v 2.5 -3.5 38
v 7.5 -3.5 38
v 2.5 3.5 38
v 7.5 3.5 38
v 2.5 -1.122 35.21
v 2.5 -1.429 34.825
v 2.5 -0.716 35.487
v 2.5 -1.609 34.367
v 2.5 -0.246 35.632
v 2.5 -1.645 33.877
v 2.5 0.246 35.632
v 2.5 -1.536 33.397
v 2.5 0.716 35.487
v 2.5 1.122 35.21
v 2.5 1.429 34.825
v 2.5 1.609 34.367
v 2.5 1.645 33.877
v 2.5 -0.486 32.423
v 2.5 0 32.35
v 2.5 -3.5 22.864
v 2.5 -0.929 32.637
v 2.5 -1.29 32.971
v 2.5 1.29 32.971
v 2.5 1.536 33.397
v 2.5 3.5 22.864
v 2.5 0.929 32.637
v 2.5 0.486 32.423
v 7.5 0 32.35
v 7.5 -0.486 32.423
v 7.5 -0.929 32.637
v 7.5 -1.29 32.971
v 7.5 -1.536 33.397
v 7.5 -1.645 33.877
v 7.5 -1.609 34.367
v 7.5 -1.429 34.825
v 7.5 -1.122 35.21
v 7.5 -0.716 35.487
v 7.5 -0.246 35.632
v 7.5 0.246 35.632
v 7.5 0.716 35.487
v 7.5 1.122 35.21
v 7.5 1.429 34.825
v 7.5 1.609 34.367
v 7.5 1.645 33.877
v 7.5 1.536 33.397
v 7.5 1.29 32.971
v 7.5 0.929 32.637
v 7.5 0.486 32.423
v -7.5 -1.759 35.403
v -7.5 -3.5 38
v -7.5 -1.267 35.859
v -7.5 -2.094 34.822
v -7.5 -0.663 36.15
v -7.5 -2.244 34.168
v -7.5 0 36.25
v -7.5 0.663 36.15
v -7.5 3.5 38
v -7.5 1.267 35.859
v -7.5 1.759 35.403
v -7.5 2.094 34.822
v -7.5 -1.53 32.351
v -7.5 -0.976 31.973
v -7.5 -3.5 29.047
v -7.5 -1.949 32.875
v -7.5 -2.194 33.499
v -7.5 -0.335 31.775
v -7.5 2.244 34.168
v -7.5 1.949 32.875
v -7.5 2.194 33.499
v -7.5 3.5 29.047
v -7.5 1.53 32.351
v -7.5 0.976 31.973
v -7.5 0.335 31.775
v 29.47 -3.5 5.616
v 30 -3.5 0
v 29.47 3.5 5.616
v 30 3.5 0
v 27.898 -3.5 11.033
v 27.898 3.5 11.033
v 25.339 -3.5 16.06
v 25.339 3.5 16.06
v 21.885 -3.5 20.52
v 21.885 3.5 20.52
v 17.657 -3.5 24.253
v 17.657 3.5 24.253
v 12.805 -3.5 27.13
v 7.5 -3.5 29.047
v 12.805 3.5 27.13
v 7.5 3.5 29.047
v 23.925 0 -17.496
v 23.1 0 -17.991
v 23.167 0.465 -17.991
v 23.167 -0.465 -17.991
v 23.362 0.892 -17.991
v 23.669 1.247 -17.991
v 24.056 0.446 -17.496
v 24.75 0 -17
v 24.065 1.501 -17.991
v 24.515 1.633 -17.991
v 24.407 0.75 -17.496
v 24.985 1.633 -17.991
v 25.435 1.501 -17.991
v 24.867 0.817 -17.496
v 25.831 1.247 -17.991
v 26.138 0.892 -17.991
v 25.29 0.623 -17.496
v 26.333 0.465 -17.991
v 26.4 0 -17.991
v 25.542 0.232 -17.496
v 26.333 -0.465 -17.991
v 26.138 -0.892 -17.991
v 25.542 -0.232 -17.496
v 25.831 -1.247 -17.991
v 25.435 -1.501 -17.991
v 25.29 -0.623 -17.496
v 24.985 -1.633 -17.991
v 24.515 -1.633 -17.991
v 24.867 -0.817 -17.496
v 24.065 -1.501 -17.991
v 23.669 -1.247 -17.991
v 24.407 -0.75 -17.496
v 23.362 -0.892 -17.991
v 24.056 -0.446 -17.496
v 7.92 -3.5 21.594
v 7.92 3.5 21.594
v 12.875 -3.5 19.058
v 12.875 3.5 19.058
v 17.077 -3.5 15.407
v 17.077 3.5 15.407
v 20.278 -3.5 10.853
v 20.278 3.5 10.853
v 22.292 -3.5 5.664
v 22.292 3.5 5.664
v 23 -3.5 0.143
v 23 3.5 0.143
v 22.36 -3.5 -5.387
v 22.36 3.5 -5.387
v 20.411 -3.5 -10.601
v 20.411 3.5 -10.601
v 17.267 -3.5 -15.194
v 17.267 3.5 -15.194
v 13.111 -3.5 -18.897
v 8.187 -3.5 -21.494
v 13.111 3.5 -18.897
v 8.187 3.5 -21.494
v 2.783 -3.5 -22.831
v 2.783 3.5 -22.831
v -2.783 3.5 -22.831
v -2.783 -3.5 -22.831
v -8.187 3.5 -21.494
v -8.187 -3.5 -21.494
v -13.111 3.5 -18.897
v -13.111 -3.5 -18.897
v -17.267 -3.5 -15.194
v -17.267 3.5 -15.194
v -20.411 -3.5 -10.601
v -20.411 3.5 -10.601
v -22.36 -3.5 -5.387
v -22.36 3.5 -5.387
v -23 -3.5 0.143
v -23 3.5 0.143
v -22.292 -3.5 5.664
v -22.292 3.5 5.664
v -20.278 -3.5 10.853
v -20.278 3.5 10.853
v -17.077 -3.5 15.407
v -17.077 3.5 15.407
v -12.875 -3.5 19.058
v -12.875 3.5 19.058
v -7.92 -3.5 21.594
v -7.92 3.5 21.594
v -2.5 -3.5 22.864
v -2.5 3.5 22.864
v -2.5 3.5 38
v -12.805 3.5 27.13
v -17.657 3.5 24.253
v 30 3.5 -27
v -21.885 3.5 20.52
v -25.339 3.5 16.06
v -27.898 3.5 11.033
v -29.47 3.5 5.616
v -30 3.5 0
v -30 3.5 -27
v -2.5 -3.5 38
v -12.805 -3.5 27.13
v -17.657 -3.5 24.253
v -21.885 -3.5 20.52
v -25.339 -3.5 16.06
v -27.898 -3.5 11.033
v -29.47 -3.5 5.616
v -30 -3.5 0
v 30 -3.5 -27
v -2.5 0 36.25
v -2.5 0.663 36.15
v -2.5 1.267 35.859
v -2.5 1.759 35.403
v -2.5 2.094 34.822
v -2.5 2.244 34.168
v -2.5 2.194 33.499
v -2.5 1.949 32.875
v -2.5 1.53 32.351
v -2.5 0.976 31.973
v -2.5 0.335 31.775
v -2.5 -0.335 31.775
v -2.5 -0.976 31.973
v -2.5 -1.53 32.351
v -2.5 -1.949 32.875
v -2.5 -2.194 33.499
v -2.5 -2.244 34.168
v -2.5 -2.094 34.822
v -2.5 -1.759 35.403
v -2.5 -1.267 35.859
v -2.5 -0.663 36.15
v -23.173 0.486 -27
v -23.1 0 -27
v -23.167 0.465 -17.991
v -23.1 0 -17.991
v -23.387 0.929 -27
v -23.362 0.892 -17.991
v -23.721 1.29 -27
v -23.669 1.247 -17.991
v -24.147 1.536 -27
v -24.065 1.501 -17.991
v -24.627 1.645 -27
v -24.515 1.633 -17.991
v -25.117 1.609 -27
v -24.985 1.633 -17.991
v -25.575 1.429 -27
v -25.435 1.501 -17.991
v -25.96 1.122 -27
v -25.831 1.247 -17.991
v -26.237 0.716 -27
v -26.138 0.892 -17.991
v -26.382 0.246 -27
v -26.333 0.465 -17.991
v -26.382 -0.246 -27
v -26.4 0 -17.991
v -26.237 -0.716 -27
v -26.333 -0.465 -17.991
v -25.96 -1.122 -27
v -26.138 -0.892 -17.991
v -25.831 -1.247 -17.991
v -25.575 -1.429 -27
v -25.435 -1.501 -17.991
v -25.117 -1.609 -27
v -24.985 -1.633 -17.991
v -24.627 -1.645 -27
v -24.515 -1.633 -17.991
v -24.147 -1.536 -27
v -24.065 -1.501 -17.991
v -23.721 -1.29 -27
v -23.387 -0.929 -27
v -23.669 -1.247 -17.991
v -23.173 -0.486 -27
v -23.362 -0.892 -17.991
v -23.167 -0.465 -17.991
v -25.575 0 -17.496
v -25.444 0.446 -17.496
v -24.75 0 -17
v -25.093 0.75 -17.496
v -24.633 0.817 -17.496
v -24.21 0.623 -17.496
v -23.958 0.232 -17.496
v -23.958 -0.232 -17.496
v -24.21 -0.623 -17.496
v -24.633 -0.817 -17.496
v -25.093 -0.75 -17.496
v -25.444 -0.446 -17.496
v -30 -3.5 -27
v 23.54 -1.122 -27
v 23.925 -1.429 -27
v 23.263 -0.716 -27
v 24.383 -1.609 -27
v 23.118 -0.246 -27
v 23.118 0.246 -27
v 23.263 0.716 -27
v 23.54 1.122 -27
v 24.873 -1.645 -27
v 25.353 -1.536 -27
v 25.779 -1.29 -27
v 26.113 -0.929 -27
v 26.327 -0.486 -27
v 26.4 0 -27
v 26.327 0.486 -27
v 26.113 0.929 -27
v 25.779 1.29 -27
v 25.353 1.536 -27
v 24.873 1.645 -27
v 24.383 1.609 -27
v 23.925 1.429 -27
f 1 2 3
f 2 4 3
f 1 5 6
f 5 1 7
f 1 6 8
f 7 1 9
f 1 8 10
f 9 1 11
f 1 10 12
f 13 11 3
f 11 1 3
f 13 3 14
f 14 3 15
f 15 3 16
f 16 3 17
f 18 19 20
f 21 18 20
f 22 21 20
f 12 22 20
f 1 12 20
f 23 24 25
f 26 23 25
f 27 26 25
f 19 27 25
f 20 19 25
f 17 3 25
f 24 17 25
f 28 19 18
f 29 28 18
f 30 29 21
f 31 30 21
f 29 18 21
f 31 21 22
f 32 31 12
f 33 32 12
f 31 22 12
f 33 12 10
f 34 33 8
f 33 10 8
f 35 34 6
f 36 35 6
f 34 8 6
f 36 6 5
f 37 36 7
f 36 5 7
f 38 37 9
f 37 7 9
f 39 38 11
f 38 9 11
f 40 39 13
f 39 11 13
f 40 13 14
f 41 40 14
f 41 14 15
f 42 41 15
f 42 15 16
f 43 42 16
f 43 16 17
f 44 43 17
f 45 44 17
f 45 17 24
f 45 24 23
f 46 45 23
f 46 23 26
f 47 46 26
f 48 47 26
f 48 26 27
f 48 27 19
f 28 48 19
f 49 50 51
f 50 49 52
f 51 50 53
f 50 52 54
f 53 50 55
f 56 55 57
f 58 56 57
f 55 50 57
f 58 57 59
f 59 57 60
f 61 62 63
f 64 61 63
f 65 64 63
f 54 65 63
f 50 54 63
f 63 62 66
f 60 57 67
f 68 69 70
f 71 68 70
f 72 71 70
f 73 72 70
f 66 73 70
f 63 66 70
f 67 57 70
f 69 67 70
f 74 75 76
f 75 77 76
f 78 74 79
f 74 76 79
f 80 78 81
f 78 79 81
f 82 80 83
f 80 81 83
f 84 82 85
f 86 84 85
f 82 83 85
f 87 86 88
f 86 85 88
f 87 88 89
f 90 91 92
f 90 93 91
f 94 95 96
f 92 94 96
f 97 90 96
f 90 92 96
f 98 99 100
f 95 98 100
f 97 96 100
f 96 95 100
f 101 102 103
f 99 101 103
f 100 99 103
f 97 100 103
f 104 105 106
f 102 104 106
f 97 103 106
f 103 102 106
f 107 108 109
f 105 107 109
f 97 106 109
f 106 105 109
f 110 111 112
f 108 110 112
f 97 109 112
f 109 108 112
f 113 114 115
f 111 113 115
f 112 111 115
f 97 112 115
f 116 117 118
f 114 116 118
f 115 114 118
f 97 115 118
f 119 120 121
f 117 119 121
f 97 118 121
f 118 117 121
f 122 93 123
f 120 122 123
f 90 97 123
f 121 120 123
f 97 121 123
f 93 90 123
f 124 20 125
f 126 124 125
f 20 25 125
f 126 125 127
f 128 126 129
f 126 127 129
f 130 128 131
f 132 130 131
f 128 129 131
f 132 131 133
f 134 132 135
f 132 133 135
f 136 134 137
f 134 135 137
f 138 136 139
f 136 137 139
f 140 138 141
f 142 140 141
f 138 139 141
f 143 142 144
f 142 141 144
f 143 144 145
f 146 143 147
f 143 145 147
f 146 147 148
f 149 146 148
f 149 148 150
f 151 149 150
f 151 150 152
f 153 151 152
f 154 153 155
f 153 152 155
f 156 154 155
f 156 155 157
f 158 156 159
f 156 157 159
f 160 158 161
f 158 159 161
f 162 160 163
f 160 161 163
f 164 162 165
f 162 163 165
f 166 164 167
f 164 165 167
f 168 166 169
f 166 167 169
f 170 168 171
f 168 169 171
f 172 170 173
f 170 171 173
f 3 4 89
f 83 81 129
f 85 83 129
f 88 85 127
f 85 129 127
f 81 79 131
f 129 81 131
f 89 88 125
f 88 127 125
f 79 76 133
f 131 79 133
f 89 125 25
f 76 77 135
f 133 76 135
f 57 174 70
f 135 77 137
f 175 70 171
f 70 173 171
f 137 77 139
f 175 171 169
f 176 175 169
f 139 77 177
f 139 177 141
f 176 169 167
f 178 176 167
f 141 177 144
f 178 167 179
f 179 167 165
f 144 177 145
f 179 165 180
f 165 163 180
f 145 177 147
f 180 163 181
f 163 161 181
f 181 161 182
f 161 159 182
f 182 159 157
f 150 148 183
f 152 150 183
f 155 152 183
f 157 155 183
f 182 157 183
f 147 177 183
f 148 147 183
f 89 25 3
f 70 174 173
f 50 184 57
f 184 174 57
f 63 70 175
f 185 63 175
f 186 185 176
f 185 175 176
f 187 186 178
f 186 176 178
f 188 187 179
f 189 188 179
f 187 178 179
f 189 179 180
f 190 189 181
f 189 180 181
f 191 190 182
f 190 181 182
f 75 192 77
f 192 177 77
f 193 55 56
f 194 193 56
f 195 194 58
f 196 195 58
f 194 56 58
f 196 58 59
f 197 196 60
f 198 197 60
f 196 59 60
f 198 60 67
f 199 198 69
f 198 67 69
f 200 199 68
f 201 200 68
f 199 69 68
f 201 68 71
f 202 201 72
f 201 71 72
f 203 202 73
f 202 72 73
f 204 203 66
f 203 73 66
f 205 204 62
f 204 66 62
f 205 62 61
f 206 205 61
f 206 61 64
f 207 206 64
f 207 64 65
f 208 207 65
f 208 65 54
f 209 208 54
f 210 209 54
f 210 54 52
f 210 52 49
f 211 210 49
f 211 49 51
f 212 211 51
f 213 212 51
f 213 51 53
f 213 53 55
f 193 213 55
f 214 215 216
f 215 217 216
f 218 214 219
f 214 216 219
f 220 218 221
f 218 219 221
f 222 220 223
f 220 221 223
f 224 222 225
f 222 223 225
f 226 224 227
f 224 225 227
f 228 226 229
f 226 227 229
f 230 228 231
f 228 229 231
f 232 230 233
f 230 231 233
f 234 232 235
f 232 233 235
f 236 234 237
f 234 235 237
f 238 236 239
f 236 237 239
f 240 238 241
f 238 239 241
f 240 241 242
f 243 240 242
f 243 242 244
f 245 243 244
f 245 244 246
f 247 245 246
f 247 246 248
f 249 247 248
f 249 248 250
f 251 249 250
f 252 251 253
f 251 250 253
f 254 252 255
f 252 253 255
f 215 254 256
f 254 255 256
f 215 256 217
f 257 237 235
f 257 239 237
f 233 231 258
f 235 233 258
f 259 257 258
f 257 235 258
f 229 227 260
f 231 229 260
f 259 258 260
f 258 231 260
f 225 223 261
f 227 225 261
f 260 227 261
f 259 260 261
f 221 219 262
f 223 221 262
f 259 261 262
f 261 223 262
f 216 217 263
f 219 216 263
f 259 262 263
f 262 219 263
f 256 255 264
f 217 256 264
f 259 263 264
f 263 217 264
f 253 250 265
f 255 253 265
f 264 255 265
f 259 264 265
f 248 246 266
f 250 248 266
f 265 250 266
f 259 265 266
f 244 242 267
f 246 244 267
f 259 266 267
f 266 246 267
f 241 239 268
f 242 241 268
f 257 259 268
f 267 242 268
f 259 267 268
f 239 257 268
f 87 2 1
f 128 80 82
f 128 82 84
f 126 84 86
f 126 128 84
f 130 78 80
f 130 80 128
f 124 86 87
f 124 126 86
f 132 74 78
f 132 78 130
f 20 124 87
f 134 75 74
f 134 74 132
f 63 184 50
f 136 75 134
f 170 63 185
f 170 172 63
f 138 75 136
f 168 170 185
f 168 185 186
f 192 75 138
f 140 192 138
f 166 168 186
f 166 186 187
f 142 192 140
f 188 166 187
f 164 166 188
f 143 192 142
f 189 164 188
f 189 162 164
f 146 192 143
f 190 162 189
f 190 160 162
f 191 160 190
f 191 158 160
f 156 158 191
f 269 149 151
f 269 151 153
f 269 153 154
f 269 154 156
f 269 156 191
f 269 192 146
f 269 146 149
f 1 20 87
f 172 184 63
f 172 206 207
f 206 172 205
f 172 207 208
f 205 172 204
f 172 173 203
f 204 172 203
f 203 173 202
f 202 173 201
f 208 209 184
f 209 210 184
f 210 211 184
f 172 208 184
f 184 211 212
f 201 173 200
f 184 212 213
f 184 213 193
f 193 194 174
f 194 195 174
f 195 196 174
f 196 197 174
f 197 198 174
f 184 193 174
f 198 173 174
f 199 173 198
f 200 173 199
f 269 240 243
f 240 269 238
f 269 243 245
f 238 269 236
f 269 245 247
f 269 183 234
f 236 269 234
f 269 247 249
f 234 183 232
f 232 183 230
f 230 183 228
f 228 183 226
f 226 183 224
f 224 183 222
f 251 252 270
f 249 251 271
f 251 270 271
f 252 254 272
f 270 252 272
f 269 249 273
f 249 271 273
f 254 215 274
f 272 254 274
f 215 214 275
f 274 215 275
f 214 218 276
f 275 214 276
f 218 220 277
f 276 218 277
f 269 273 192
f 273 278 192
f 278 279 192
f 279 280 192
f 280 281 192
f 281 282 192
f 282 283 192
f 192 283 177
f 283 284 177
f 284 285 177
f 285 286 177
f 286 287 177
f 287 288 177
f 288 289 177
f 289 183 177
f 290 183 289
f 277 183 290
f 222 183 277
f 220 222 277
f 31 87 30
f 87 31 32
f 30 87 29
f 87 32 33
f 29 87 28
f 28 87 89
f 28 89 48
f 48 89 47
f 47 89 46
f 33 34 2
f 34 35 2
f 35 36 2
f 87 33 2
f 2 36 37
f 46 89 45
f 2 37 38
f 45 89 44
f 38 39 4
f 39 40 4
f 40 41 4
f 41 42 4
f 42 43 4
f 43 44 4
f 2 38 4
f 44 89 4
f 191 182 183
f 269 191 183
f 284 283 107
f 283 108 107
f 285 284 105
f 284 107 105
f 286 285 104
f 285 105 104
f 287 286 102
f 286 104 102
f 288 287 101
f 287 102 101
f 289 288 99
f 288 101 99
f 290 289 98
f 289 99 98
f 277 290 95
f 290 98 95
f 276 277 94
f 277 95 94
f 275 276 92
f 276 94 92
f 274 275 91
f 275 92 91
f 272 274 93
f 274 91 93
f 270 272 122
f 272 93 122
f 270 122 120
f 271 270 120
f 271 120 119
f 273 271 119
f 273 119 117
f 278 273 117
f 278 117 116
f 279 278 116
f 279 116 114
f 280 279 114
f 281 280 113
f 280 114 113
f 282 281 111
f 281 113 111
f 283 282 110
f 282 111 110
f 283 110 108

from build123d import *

# Parameters (mm, degrees)
BOSS_EXTRUDE1_DEPTH   = 3.5
M4_TAPPED_HOLE2_D     = 3.3
M4_TAPPED_HOLE2_DEPTH = 9.008579979
M4_TAPPED_HOLE2_TIP   = 0.991420021
CUT_EXTRUDE1_REACH    = 55.502
SKETCH4_R             = 2.25
M4_TAPPED_HOLE1_D     = 3.3
M4_TAPPED_HOLE1_DEPTH = 9.108579979
M4_TAPPED_HOLE1_TIP   = 0.991420021


with BuildPart() as part:
    # Sketch1 → Boss-Extrude1 (new, symmetric)
    with BuildSketch(Plane(origin=(0, 0, 0), x_dir=(1, 0, 0), z_dir=(0, 1, 0))):
        with BuildLine():
            Line((-30, 0), (-30, 27))
            Line((-30, 27), (30, 27))
            Line((30, 27), (30, 0))
            ThreePointArc((30, 0), (23.717082451, -18.371173071), (7.5, -29.047375097))
            Line((7.5, -29.047375097), (7.5, -38))
            Line((7.5, -38), (2.5, -38))
            Line((2.5, -38), (2.5, -22.86372673))
            ThreePointArc((2.5, -22.86372673), (0, 23), (-2.5, -22.86372673))
            Line((-2.5, -22.86372673), (-2.5, -38))
            Line((-2.5, -38), (-7.5, -38))
            Line((-7.5, -38), (-7.5, -29.047375097))
            ThreePointArc((-7.5, -29.047375097), (-23.717082451, -18.371173071), (-30, 0))
        make_face()
    extrude(amount=BOSS_EXTRUDE1_DEPTH, both=True)

    # M4 Tapped Hole2
    with Locations(Plane(origin=(-24.75, 0, -27), x_dir=(-1, 0, 0), z_dir=(0, 0, -1))):
        with Locations((0, 0), (-49.5, 0)):
            Hole(M4_TAPPED_HOLE2_D / 2, depth=M4_TAPPED_HOLE2_DEPTH)
            with Locations((0, 0, -(M4_TAPPED_HOLE2_DEPTH + M4_TAPPED_HOLE2_TIP / 2))):  # 118° drill point
                Cone(0, M4_TAPPED_HOLE2_D / 2, M4_TAPPED_HOLE2_TIP, mode=Mode.SUBTRACT)

    # Sketch4 → Cut-Extrude1 (cut, up to next)
    with BuildSketch(Plane.ZY.offset(7.5), mode=Mode.PRIVATE) as cut_extrude1_sk1:
        with Locations((34, 0)):
            Circle(SKETCH4_R)
    cut_extrude1_tool1 = extrude(cut_extrude1_sk1.sketch, amount=-CUT_EXTRUDE1_REACH, mode=Mode.PRIVATE) & part.part
    add(cut_extrude1_tool1.solids().sort_by_distance((-7.5, 0, 34))[0], mode=Mode.SUBTRACT)

    # M4 Tapped Hole1
    with Locations(Plane(origin=(7.5, 0, 34), x_dir=(0, 0, 1), z_dir=(1, 0, 0))):
        with Locations((0, 0)):
            Hole(M4_TAPPED_HOLE1_D / 2, depth=M4_TAPPED_HOLE1_DEPTH)
            with Locations((0, 0, -(M4_TAPPED_HOLE1_DEPTH + M4_TAPPED_HOLE1_TIP / 2))):  # 118° drill point
                Cone(0, M4_TAPPED_HOLE1_D / 2, M4_TAPPED_HOLE1_TIP, mode=Mode.SUBTRACT)


solid = part.part
